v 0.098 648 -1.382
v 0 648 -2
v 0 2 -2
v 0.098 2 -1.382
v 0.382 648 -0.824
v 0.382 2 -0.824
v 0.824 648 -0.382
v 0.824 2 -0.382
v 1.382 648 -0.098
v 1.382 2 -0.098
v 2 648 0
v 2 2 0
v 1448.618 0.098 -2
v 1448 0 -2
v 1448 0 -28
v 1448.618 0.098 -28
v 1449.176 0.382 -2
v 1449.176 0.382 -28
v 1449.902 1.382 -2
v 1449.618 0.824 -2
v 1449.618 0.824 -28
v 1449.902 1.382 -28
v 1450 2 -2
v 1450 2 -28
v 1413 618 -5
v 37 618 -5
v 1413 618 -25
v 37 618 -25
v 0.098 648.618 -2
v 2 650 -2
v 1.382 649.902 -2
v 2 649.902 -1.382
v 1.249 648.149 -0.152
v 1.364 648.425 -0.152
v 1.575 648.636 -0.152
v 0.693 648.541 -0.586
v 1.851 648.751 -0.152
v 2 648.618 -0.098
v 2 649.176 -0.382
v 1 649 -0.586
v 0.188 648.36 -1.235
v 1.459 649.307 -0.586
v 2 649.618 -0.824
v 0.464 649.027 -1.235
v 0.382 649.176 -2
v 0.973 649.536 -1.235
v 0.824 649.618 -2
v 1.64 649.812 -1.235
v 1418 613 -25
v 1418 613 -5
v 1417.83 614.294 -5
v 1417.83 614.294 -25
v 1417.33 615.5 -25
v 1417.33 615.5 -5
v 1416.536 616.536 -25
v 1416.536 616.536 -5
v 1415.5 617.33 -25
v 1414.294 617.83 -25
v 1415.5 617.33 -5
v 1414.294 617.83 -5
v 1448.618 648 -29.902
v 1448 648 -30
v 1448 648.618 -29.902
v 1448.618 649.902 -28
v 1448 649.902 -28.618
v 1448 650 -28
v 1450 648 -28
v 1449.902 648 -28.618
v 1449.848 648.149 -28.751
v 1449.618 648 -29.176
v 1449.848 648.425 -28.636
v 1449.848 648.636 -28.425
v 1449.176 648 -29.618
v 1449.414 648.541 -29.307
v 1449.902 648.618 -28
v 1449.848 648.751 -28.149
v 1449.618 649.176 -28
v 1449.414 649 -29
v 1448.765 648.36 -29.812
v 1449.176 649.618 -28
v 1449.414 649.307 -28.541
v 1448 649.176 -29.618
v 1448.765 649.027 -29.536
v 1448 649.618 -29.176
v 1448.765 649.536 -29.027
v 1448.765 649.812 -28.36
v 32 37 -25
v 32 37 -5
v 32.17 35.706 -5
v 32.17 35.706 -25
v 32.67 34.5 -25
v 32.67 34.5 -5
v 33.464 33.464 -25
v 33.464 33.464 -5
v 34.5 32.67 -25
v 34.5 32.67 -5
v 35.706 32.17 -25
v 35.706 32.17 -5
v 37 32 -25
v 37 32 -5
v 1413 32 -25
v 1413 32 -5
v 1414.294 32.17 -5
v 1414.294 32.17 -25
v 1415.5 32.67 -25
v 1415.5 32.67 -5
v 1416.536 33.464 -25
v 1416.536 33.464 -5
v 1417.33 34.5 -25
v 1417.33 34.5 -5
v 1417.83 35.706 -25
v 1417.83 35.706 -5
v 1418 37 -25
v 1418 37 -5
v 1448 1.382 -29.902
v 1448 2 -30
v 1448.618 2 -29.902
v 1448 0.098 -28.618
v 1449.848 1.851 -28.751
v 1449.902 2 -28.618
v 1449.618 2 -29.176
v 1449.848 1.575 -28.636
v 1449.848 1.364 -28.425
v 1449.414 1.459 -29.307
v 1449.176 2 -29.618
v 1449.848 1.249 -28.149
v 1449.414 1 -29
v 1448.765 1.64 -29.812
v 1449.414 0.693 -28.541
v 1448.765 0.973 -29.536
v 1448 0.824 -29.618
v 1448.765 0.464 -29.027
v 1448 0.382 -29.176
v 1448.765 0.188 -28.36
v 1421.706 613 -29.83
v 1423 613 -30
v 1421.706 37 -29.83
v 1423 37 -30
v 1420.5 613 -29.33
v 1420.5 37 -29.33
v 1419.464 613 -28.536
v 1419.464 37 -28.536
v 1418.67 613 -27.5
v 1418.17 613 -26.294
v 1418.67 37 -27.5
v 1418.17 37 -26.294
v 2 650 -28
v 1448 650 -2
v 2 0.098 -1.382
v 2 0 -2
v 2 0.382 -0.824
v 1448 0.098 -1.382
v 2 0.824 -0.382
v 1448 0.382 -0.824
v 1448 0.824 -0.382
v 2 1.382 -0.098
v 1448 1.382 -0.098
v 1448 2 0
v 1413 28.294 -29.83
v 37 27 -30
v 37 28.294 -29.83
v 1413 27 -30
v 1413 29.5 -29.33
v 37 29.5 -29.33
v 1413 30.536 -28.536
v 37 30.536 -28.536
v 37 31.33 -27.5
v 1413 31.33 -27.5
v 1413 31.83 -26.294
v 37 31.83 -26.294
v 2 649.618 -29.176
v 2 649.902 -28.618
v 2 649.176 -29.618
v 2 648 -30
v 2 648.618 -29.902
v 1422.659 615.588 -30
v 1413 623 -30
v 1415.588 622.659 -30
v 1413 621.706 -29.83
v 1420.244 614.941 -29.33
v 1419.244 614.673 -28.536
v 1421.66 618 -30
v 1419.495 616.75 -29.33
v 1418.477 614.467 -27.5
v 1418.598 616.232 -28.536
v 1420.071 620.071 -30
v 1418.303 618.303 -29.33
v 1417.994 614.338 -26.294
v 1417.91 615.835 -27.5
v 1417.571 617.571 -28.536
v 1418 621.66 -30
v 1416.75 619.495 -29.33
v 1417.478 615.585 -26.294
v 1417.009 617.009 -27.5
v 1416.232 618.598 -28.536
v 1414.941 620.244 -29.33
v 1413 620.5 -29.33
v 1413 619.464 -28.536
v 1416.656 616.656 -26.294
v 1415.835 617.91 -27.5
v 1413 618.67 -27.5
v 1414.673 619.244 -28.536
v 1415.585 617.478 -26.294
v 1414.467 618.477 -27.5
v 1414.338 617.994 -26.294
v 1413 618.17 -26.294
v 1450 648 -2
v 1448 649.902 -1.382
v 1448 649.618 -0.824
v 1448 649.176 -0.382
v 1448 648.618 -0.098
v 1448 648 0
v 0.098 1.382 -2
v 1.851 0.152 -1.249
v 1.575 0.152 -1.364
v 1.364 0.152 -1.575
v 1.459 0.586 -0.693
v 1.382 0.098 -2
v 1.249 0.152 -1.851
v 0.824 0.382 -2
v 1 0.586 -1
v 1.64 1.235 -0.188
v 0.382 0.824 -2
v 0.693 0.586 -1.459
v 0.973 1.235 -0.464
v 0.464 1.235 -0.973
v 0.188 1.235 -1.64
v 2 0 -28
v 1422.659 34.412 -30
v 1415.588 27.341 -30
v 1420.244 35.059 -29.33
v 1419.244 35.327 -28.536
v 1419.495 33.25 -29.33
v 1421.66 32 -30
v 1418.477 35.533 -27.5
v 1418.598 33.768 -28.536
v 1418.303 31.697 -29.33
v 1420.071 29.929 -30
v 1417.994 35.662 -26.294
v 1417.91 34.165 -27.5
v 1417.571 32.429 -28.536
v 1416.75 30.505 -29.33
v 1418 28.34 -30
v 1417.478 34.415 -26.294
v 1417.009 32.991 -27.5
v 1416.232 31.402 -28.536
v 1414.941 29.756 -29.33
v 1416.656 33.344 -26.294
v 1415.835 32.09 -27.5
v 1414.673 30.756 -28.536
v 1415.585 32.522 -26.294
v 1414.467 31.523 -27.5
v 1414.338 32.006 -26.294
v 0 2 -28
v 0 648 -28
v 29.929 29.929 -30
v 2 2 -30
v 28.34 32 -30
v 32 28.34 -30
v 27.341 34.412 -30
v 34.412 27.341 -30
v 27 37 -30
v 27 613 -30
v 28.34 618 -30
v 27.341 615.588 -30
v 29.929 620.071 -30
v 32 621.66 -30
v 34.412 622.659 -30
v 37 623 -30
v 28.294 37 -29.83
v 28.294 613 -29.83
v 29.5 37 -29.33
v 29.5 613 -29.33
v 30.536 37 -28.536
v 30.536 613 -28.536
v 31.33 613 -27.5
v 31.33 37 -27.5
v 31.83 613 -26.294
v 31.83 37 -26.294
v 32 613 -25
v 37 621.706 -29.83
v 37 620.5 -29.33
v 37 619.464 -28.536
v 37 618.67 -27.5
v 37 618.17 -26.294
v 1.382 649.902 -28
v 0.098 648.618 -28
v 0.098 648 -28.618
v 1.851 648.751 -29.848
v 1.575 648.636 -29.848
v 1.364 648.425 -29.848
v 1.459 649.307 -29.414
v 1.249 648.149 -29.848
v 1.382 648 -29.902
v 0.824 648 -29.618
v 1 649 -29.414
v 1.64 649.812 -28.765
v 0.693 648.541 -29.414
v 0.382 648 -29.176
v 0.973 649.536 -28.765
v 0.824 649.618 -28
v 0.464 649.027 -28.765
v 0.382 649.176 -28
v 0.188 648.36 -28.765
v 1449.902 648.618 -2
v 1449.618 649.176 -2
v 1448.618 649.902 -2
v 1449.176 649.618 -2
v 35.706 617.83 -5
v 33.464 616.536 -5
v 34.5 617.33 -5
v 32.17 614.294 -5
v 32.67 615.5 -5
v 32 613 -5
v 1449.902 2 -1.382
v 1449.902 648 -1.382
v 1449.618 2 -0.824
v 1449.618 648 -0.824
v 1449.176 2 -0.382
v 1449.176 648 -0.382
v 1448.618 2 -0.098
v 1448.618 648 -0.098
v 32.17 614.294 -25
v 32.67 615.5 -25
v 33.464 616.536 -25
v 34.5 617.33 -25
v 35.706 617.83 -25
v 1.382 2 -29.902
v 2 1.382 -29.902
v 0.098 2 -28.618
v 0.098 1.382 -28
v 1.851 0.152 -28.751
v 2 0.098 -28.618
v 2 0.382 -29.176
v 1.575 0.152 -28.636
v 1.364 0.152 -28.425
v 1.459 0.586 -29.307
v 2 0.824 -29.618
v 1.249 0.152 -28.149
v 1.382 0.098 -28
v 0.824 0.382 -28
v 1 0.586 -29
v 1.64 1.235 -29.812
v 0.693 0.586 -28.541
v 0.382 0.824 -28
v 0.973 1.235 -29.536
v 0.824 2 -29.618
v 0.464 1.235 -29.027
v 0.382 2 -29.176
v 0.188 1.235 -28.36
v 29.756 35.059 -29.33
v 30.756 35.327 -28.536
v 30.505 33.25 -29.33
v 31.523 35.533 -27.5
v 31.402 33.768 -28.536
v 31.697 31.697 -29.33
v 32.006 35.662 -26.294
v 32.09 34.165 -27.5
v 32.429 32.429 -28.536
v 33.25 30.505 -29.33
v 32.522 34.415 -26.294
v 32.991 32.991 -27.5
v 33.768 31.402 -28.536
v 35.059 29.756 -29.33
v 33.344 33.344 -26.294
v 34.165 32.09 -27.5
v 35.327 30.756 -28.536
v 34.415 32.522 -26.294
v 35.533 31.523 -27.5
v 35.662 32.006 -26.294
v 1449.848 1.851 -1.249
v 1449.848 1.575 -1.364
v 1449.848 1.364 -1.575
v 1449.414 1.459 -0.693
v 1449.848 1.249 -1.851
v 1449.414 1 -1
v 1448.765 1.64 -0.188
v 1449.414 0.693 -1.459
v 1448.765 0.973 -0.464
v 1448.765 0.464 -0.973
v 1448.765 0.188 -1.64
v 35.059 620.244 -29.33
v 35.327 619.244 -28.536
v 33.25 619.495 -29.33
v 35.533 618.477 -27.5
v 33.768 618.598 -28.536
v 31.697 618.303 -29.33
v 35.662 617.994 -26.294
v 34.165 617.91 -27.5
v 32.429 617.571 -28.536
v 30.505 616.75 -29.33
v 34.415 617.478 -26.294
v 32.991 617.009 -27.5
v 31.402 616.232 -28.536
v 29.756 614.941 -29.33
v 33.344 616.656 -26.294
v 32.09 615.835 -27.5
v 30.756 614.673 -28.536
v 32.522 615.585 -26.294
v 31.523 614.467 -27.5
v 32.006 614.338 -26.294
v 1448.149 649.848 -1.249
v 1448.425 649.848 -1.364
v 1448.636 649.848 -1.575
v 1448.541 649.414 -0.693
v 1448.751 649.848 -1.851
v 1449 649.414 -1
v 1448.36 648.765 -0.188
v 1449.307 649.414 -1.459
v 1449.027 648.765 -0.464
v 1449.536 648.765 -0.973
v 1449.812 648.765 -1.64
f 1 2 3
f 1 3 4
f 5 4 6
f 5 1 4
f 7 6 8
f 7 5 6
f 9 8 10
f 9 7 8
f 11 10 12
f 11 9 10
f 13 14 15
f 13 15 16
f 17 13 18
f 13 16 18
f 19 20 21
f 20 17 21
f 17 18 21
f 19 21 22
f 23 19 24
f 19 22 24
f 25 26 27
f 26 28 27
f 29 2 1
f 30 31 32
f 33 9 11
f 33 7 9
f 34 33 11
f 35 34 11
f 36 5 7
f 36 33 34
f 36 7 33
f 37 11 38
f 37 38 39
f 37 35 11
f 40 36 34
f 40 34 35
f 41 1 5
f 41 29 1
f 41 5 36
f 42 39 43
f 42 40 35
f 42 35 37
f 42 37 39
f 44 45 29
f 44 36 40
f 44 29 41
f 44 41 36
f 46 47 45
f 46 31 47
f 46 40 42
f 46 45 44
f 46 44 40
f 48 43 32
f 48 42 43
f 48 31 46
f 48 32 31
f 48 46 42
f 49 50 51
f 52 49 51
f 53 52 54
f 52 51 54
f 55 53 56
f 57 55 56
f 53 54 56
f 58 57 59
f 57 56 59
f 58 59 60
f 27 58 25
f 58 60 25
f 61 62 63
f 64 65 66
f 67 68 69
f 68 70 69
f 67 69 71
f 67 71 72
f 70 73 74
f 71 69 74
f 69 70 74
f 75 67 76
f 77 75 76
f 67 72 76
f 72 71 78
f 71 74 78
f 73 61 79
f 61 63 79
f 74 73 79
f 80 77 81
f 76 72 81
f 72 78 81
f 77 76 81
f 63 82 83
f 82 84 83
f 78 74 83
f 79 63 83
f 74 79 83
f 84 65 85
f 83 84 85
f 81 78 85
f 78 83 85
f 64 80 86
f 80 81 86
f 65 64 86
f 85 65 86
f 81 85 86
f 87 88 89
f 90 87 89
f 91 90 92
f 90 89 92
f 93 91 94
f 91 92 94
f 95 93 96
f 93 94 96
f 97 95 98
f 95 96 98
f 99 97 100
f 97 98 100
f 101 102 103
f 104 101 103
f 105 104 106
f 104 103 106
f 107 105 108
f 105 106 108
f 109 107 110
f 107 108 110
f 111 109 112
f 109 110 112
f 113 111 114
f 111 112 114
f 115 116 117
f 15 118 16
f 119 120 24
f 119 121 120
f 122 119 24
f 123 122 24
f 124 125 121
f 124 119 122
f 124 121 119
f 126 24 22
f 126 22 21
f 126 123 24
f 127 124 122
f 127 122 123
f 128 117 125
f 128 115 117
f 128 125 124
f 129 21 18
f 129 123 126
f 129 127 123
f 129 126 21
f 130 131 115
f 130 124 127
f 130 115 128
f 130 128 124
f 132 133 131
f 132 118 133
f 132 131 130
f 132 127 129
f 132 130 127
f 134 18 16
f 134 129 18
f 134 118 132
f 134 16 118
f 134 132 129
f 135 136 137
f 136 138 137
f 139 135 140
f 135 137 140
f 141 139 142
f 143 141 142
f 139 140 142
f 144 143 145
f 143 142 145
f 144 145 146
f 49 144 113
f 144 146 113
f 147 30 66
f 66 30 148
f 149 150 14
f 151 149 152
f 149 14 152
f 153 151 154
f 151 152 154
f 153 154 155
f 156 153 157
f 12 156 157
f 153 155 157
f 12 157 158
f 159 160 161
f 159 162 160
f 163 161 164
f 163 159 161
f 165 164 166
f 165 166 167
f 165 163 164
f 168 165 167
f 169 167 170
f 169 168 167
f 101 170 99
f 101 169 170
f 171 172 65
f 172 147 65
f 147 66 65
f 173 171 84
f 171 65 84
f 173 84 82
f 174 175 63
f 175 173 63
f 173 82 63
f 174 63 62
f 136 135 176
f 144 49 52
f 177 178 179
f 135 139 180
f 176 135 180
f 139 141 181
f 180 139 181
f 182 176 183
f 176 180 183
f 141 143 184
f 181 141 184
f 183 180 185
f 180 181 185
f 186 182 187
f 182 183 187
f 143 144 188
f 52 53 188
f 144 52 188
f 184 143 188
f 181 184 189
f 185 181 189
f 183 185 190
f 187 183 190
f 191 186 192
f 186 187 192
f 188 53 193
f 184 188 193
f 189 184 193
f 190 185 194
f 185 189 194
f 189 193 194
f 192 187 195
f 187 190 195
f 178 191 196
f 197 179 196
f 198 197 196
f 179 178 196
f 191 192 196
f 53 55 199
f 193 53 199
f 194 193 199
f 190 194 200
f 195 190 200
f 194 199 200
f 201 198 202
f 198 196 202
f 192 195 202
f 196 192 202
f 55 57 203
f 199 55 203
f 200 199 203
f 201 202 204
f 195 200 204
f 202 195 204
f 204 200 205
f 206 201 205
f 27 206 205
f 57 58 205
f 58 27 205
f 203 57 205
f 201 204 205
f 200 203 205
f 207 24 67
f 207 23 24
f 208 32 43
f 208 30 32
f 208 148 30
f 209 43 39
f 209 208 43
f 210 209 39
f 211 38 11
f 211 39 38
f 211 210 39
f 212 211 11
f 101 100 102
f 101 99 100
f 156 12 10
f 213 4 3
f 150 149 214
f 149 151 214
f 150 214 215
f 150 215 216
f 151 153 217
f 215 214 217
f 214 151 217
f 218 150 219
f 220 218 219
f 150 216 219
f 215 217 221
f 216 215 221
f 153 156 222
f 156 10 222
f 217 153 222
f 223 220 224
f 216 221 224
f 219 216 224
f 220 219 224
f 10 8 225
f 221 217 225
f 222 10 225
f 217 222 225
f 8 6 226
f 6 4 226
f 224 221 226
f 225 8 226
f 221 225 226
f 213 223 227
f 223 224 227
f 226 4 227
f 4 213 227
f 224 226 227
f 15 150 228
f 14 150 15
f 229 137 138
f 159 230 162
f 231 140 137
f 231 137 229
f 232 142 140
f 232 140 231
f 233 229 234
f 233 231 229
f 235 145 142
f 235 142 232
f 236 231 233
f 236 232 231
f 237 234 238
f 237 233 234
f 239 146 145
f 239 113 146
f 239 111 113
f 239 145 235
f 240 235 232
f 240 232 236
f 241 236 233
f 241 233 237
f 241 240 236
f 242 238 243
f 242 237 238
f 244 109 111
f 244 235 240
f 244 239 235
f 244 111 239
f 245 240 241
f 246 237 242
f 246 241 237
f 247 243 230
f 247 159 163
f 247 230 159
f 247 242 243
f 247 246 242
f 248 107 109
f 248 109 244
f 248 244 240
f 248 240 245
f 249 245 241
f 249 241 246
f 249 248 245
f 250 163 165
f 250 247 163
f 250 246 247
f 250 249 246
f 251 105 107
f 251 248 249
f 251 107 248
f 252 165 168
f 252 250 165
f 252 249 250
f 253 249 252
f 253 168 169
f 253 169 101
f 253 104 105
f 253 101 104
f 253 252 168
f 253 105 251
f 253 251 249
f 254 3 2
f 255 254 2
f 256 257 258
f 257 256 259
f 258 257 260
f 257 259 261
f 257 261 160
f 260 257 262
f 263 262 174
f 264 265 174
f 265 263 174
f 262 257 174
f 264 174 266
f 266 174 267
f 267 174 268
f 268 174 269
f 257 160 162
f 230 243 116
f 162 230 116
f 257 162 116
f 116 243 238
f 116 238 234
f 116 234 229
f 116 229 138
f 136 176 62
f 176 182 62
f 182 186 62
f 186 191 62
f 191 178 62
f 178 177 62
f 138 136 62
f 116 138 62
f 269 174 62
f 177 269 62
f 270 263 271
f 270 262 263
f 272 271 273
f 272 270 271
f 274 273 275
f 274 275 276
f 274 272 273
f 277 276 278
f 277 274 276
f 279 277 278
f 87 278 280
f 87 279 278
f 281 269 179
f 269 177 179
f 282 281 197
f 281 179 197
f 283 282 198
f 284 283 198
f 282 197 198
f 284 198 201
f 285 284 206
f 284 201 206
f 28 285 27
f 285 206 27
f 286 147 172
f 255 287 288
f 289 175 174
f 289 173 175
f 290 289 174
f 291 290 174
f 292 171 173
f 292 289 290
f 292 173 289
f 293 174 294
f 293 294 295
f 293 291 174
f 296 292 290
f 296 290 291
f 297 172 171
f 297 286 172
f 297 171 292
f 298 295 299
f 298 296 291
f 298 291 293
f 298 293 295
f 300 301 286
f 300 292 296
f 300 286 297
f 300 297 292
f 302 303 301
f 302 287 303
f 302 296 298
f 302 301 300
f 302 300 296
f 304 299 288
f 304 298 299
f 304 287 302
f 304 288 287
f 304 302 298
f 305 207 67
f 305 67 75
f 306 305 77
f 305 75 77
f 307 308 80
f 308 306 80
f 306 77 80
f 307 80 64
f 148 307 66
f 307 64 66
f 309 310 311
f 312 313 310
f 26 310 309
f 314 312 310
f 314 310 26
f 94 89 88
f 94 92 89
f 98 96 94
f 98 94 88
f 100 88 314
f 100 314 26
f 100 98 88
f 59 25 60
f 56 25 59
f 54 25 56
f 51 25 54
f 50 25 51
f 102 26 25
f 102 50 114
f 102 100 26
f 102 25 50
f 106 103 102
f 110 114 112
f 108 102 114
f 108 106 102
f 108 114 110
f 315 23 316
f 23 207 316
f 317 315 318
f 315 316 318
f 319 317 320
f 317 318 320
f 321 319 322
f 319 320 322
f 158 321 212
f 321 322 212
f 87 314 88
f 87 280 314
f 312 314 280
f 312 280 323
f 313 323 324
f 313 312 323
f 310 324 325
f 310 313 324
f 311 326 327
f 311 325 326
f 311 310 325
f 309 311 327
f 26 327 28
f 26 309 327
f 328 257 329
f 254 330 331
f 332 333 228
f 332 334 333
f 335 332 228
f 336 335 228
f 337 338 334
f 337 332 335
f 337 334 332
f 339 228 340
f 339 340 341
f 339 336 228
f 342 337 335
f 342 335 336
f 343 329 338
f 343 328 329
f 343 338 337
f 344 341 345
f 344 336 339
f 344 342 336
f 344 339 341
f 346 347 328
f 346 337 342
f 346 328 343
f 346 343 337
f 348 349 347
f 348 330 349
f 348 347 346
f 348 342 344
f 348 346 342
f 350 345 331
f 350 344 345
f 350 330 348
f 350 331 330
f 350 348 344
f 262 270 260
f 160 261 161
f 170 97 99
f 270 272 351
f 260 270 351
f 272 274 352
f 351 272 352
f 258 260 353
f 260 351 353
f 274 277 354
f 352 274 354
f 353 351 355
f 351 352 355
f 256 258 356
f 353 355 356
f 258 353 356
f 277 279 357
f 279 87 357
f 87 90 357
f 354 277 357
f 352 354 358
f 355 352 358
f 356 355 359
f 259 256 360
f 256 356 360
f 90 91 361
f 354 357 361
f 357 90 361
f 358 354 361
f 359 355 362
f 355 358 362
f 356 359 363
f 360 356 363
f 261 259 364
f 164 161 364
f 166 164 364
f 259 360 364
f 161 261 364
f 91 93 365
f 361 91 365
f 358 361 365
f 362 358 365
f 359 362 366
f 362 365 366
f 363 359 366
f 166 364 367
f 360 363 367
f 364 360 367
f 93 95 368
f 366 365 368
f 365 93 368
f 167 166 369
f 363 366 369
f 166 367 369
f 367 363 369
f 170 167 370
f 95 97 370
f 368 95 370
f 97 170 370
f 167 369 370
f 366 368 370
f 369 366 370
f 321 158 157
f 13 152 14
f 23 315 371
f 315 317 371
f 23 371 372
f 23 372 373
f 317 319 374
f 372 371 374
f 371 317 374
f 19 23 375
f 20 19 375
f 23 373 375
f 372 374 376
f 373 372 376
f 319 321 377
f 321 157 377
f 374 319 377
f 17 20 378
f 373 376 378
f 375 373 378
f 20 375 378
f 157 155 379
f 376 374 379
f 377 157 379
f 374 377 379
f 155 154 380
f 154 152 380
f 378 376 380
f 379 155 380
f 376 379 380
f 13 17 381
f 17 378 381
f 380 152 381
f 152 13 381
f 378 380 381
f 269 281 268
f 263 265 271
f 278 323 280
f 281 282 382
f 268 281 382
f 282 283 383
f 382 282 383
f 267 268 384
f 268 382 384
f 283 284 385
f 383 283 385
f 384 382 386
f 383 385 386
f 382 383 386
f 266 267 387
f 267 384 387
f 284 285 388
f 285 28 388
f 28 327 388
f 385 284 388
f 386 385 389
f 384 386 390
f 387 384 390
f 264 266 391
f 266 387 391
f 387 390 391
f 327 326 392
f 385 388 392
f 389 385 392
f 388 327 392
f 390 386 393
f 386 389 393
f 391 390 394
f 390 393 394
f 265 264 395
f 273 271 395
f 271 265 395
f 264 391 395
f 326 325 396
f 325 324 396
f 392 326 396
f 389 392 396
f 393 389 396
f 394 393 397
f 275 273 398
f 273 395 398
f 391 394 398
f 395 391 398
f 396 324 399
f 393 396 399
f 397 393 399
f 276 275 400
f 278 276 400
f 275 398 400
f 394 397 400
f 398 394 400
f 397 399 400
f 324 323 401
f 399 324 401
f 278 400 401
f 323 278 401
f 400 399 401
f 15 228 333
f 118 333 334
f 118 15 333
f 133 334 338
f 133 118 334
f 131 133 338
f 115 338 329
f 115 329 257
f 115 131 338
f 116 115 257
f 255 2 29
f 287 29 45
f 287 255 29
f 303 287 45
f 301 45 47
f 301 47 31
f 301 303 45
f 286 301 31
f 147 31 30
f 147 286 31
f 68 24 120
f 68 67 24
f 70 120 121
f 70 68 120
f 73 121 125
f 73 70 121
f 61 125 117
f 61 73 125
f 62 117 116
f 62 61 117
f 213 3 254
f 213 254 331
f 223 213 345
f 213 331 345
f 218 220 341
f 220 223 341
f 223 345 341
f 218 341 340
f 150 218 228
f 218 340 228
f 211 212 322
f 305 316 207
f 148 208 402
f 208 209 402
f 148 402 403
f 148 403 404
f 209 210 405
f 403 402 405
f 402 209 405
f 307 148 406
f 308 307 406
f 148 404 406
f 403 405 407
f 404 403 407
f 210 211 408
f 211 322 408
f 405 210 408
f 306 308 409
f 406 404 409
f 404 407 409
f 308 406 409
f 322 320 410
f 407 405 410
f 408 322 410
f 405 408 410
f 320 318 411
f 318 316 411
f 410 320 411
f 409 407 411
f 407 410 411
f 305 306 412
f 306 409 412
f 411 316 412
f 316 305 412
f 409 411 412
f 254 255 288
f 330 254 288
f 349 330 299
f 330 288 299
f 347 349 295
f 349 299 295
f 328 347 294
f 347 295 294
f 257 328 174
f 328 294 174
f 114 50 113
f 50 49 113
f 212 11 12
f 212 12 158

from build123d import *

# Parameters (mm, degrees)
F0_W     = 1450
F0_H     = 650
F1_DEPTH = 30
F2_R     = 2
F3_W     = 1386
F3_H     = 586
F4_DEPTH = 25
F5_R     = 5


with BuildPart() as f1:
    # F0 (on Top) → F1 (new body)
    with BuildSketch(Plane.XY):
        with Locations((725, 325)):
            Rectangle(F0_W, F0_H)
    extrude(amount=-F1_DEPTH)

    # F2
    f2_edges = [f1.edges().sort_by_distance(p)[0] for p in [
        (0, 650, -15),
        (725, 650, -30),
        (0, 325, -30),
        (725, 0, -30),
        (1450, 325, -30),
        (0, 325, 0),
        (725, 0, 0),
        (1450, 325, 0),
        (725, 650, 0),
        (0, 0, -15),
        (1450, 0, -15),
        (1450, 650, -15),
    ]]
    fillet(f2_edges, radius=F2_R)

    # F3 (on face) → F4 (cut)
    with BuildSketch(Plane(origin=(0, 0, -30), x_dir=(1, 0, 0), z_dir=(0, 0, -1))):
        with Locations((725, -325)):
            Rectangle(F3_W, F3_H)
    extrude(amount=-F4_DEPTH, mode=Mode.SUBTRACT)

    # F5
    f5_edges = [f1.edges().sort_by_distance(p)[0] for p in [
        (1418, 618, -17.5),
        (1418, 32, -17.5),
        (32, 32, -17.5),
        (32, 325, -30),
        (1418, 325, -30),
        (32, 618, -17.5),
        (725, 618, -30),
        (725, 32, -30),
    ]]
    fillet(f5_edges, radius=F5_R)


solid = f1.part
